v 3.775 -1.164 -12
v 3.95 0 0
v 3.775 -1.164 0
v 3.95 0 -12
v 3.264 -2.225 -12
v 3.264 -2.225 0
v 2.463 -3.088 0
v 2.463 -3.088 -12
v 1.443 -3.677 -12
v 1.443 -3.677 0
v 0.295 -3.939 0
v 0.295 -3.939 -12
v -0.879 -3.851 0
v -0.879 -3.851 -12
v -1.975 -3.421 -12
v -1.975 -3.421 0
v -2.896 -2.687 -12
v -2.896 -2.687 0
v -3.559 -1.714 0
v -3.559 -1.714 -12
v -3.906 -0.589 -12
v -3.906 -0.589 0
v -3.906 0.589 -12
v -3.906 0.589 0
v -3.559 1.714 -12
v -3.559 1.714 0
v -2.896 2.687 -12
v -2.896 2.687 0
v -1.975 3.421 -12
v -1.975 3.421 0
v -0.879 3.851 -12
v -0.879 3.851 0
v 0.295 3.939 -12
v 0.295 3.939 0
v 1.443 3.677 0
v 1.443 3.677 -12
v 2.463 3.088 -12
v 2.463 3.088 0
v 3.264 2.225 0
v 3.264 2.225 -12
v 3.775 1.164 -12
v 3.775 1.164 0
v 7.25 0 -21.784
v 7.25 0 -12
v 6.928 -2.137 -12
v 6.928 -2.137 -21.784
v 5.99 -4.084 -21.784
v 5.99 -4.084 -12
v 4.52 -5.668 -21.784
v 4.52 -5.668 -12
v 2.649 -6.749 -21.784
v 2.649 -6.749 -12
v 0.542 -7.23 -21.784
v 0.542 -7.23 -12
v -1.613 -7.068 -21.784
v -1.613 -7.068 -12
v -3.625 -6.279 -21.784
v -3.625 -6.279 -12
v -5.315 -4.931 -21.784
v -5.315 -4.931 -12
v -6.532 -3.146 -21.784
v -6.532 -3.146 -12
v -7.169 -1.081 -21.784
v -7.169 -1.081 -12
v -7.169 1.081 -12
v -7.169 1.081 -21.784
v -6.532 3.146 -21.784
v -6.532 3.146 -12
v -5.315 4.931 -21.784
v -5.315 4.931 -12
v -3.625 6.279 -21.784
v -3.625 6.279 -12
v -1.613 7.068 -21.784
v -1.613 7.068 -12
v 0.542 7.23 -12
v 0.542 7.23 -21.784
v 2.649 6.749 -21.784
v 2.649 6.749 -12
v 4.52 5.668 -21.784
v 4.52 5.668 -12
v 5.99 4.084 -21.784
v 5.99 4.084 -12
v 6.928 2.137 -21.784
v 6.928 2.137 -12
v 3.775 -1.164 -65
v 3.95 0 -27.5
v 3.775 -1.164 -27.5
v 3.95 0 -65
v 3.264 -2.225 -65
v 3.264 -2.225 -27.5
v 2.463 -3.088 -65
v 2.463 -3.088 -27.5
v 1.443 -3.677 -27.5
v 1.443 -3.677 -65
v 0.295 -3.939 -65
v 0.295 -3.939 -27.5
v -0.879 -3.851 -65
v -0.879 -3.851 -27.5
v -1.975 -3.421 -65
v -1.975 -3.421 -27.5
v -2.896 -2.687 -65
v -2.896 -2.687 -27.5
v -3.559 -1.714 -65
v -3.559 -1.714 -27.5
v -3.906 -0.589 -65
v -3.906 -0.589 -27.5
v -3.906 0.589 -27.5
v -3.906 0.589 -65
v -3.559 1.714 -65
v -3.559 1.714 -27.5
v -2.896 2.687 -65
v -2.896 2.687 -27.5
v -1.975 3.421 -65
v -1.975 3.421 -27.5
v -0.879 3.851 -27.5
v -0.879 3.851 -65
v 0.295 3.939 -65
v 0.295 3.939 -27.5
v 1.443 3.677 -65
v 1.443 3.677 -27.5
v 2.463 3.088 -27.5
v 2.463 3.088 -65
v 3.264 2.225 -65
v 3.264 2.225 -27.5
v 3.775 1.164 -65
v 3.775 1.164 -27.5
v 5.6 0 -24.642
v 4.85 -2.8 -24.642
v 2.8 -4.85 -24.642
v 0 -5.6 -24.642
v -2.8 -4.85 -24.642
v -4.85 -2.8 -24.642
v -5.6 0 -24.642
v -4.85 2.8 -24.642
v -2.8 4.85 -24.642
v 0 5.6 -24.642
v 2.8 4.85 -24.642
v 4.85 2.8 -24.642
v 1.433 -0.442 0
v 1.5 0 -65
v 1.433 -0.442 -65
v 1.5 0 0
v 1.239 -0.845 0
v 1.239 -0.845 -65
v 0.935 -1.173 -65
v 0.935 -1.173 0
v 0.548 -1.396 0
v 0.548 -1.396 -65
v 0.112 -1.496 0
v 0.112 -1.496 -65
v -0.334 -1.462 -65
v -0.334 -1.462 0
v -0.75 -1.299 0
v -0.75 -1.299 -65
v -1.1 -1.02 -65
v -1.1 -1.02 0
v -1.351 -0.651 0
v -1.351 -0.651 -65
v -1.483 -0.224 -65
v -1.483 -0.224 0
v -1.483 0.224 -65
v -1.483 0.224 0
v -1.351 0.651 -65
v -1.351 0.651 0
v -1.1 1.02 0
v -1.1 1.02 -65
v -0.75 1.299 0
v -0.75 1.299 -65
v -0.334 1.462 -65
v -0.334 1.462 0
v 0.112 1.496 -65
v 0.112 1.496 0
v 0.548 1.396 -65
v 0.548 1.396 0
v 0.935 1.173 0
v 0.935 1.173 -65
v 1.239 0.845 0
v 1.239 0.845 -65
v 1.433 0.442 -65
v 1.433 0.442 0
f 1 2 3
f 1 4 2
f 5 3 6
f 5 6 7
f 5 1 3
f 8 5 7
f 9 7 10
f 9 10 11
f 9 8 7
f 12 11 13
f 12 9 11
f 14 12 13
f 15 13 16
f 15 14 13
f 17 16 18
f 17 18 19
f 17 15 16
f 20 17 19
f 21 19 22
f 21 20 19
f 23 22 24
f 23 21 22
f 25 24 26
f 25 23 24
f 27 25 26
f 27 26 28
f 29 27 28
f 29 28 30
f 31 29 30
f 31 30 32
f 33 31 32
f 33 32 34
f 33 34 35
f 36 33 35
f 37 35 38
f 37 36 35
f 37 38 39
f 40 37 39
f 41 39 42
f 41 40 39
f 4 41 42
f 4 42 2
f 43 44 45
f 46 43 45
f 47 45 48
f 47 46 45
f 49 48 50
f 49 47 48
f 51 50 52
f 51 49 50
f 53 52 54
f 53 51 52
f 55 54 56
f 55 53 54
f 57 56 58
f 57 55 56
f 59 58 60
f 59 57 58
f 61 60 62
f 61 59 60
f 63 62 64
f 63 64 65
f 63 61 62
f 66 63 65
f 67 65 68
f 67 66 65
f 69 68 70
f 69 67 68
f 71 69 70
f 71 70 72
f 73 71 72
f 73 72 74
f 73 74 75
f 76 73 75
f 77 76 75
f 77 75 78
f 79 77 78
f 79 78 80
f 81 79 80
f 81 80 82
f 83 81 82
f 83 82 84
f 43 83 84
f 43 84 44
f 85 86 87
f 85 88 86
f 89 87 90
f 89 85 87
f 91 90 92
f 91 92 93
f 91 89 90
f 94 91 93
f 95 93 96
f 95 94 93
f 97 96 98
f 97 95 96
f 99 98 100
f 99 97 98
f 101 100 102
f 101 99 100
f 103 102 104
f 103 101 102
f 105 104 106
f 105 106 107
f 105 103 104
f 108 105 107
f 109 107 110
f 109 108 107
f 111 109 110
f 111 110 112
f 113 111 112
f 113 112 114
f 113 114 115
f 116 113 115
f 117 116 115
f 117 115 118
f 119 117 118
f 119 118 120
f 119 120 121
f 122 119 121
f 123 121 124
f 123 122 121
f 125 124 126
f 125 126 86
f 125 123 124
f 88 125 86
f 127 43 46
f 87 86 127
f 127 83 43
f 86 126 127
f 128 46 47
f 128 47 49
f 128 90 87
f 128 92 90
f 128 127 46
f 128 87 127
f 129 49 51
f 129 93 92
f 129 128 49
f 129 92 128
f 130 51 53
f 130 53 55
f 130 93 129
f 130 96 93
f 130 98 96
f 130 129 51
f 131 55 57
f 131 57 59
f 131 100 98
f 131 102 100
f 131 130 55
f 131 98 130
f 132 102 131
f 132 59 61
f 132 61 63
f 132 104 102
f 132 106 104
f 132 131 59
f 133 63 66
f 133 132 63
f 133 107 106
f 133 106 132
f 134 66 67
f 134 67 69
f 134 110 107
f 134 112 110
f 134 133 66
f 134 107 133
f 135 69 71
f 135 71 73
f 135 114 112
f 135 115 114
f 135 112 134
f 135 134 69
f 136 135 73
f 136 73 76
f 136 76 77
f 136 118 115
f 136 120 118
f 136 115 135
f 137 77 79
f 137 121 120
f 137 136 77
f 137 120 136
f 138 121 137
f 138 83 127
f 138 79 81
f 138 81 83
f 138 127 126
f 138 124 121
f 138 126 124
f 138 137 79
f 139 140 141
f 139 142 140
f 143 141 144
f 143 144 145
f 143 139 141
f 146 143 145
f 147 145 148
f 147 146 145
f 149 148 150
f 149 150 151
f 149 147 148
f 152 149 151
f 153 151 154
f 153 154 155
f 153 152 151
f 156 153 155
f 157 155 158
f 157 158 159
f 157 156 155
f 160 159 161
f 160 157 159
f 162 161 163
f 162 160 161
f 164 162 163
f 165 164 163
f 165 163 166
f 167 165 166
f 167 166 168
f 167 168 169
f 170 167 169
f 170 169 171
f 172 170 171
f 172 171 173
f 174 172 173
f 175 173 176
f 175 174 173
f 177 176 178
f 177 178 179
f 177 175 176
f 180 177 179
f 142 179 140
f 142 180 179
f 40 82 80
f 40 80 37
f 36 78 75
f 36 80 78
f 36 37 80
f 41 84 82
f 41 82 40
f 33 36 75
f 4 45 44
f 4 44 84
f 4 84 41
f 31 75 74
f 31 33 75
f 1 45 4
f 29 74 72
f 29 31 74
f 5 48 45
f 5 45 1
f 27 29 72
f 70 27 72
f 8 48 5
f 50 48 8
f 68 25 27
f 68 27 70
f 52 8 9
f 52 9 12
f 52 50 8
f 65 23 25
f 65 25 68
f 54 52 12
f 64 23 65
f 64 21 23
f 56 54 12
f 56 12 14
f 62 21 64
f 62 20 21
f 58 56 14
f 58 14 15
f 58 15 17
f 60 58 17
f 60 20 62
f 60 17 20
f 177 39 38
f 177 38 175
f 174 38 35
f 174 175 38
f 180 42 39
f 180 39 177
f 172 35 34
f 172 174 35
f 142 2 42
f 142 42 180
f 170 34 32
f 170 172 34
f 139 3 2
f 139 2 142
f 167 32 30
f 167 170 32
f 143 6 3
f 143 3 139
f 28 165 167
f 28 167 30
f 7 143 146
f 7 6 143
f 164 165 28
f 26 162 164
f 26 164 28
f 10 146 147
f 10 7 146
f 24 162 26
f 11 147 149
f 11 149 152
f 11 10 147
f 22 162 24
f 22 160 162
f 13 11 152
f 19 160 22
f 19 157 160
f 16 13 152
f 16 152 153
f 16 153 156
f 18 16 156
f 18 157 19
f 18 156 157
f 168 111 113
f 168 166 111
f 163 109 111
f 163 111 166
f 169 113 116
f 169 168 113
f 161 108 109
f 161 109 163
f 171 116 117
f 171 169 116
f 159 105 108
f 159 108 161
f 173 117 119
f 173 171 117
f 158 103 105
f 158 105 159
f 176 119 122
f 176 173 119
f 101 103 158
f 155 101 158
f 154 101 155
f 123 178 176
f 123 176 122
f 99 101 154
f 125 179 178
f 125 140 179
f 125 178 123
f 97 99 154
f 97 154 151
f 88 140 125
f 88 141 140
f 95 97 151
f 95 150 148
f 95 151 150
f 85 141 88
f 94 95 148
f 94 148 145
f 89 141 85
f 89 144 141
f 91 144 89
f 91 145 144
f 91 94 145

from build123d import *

# Parameters (mm, degrees)
CHAMFER1_SIZE   = 6.062177826
CHAMFER1_SIZE_2 = 10.5


with BuildPart() as part:
    # Sketch2 → Revolve1 (revolve)
    with BuildSketch(Plane(origin=(0, 0, 0), x_dir=(1, 0, 0), z_dir=(0, 1, 0))):
        Polygon((1.5, 0), (3.95, 0), (3.95, 12), (7.25, 12), (7.25, 17), (3.95, 17), (3.95, 65), (1.5, 65), align=None)
    revolve(axis=Axis((0, 0, 0), (0, 0, -1)))

    # Chamfer1
    # the kernel refuses this chamfer: 10.5, 6.062177826 mm, written as the material it adds along each edge
    with BuildSketch(Plane(origin=(0, 0, -17), x_dir=(1, 0, 0), z_dir=(0, 1, 0))) as chamfer1_piece_1_section:
        Polygon((3.95 + CHAMFER1_SIZE, 0), (3.95, CHAMFER1_SIZE_2), (3.95, 0), align=None)
    chamfer1_piece_1 = revolve(axis=Axis((0, 0, -17), (0, 0, -1)), mode=Mode.PRIVATE)
    chamfer1_piece_1 = chamfer1_piece_1 & Plane(origin=(0, 0, -24.775013255), x_dir=(1, 0, 0), z_dir=(0, 0, -1)) * Cylinder(7.25, 42, mode=Mode.PRIVATE)
    add(chamfer1_piece_1)


solid = part.part
